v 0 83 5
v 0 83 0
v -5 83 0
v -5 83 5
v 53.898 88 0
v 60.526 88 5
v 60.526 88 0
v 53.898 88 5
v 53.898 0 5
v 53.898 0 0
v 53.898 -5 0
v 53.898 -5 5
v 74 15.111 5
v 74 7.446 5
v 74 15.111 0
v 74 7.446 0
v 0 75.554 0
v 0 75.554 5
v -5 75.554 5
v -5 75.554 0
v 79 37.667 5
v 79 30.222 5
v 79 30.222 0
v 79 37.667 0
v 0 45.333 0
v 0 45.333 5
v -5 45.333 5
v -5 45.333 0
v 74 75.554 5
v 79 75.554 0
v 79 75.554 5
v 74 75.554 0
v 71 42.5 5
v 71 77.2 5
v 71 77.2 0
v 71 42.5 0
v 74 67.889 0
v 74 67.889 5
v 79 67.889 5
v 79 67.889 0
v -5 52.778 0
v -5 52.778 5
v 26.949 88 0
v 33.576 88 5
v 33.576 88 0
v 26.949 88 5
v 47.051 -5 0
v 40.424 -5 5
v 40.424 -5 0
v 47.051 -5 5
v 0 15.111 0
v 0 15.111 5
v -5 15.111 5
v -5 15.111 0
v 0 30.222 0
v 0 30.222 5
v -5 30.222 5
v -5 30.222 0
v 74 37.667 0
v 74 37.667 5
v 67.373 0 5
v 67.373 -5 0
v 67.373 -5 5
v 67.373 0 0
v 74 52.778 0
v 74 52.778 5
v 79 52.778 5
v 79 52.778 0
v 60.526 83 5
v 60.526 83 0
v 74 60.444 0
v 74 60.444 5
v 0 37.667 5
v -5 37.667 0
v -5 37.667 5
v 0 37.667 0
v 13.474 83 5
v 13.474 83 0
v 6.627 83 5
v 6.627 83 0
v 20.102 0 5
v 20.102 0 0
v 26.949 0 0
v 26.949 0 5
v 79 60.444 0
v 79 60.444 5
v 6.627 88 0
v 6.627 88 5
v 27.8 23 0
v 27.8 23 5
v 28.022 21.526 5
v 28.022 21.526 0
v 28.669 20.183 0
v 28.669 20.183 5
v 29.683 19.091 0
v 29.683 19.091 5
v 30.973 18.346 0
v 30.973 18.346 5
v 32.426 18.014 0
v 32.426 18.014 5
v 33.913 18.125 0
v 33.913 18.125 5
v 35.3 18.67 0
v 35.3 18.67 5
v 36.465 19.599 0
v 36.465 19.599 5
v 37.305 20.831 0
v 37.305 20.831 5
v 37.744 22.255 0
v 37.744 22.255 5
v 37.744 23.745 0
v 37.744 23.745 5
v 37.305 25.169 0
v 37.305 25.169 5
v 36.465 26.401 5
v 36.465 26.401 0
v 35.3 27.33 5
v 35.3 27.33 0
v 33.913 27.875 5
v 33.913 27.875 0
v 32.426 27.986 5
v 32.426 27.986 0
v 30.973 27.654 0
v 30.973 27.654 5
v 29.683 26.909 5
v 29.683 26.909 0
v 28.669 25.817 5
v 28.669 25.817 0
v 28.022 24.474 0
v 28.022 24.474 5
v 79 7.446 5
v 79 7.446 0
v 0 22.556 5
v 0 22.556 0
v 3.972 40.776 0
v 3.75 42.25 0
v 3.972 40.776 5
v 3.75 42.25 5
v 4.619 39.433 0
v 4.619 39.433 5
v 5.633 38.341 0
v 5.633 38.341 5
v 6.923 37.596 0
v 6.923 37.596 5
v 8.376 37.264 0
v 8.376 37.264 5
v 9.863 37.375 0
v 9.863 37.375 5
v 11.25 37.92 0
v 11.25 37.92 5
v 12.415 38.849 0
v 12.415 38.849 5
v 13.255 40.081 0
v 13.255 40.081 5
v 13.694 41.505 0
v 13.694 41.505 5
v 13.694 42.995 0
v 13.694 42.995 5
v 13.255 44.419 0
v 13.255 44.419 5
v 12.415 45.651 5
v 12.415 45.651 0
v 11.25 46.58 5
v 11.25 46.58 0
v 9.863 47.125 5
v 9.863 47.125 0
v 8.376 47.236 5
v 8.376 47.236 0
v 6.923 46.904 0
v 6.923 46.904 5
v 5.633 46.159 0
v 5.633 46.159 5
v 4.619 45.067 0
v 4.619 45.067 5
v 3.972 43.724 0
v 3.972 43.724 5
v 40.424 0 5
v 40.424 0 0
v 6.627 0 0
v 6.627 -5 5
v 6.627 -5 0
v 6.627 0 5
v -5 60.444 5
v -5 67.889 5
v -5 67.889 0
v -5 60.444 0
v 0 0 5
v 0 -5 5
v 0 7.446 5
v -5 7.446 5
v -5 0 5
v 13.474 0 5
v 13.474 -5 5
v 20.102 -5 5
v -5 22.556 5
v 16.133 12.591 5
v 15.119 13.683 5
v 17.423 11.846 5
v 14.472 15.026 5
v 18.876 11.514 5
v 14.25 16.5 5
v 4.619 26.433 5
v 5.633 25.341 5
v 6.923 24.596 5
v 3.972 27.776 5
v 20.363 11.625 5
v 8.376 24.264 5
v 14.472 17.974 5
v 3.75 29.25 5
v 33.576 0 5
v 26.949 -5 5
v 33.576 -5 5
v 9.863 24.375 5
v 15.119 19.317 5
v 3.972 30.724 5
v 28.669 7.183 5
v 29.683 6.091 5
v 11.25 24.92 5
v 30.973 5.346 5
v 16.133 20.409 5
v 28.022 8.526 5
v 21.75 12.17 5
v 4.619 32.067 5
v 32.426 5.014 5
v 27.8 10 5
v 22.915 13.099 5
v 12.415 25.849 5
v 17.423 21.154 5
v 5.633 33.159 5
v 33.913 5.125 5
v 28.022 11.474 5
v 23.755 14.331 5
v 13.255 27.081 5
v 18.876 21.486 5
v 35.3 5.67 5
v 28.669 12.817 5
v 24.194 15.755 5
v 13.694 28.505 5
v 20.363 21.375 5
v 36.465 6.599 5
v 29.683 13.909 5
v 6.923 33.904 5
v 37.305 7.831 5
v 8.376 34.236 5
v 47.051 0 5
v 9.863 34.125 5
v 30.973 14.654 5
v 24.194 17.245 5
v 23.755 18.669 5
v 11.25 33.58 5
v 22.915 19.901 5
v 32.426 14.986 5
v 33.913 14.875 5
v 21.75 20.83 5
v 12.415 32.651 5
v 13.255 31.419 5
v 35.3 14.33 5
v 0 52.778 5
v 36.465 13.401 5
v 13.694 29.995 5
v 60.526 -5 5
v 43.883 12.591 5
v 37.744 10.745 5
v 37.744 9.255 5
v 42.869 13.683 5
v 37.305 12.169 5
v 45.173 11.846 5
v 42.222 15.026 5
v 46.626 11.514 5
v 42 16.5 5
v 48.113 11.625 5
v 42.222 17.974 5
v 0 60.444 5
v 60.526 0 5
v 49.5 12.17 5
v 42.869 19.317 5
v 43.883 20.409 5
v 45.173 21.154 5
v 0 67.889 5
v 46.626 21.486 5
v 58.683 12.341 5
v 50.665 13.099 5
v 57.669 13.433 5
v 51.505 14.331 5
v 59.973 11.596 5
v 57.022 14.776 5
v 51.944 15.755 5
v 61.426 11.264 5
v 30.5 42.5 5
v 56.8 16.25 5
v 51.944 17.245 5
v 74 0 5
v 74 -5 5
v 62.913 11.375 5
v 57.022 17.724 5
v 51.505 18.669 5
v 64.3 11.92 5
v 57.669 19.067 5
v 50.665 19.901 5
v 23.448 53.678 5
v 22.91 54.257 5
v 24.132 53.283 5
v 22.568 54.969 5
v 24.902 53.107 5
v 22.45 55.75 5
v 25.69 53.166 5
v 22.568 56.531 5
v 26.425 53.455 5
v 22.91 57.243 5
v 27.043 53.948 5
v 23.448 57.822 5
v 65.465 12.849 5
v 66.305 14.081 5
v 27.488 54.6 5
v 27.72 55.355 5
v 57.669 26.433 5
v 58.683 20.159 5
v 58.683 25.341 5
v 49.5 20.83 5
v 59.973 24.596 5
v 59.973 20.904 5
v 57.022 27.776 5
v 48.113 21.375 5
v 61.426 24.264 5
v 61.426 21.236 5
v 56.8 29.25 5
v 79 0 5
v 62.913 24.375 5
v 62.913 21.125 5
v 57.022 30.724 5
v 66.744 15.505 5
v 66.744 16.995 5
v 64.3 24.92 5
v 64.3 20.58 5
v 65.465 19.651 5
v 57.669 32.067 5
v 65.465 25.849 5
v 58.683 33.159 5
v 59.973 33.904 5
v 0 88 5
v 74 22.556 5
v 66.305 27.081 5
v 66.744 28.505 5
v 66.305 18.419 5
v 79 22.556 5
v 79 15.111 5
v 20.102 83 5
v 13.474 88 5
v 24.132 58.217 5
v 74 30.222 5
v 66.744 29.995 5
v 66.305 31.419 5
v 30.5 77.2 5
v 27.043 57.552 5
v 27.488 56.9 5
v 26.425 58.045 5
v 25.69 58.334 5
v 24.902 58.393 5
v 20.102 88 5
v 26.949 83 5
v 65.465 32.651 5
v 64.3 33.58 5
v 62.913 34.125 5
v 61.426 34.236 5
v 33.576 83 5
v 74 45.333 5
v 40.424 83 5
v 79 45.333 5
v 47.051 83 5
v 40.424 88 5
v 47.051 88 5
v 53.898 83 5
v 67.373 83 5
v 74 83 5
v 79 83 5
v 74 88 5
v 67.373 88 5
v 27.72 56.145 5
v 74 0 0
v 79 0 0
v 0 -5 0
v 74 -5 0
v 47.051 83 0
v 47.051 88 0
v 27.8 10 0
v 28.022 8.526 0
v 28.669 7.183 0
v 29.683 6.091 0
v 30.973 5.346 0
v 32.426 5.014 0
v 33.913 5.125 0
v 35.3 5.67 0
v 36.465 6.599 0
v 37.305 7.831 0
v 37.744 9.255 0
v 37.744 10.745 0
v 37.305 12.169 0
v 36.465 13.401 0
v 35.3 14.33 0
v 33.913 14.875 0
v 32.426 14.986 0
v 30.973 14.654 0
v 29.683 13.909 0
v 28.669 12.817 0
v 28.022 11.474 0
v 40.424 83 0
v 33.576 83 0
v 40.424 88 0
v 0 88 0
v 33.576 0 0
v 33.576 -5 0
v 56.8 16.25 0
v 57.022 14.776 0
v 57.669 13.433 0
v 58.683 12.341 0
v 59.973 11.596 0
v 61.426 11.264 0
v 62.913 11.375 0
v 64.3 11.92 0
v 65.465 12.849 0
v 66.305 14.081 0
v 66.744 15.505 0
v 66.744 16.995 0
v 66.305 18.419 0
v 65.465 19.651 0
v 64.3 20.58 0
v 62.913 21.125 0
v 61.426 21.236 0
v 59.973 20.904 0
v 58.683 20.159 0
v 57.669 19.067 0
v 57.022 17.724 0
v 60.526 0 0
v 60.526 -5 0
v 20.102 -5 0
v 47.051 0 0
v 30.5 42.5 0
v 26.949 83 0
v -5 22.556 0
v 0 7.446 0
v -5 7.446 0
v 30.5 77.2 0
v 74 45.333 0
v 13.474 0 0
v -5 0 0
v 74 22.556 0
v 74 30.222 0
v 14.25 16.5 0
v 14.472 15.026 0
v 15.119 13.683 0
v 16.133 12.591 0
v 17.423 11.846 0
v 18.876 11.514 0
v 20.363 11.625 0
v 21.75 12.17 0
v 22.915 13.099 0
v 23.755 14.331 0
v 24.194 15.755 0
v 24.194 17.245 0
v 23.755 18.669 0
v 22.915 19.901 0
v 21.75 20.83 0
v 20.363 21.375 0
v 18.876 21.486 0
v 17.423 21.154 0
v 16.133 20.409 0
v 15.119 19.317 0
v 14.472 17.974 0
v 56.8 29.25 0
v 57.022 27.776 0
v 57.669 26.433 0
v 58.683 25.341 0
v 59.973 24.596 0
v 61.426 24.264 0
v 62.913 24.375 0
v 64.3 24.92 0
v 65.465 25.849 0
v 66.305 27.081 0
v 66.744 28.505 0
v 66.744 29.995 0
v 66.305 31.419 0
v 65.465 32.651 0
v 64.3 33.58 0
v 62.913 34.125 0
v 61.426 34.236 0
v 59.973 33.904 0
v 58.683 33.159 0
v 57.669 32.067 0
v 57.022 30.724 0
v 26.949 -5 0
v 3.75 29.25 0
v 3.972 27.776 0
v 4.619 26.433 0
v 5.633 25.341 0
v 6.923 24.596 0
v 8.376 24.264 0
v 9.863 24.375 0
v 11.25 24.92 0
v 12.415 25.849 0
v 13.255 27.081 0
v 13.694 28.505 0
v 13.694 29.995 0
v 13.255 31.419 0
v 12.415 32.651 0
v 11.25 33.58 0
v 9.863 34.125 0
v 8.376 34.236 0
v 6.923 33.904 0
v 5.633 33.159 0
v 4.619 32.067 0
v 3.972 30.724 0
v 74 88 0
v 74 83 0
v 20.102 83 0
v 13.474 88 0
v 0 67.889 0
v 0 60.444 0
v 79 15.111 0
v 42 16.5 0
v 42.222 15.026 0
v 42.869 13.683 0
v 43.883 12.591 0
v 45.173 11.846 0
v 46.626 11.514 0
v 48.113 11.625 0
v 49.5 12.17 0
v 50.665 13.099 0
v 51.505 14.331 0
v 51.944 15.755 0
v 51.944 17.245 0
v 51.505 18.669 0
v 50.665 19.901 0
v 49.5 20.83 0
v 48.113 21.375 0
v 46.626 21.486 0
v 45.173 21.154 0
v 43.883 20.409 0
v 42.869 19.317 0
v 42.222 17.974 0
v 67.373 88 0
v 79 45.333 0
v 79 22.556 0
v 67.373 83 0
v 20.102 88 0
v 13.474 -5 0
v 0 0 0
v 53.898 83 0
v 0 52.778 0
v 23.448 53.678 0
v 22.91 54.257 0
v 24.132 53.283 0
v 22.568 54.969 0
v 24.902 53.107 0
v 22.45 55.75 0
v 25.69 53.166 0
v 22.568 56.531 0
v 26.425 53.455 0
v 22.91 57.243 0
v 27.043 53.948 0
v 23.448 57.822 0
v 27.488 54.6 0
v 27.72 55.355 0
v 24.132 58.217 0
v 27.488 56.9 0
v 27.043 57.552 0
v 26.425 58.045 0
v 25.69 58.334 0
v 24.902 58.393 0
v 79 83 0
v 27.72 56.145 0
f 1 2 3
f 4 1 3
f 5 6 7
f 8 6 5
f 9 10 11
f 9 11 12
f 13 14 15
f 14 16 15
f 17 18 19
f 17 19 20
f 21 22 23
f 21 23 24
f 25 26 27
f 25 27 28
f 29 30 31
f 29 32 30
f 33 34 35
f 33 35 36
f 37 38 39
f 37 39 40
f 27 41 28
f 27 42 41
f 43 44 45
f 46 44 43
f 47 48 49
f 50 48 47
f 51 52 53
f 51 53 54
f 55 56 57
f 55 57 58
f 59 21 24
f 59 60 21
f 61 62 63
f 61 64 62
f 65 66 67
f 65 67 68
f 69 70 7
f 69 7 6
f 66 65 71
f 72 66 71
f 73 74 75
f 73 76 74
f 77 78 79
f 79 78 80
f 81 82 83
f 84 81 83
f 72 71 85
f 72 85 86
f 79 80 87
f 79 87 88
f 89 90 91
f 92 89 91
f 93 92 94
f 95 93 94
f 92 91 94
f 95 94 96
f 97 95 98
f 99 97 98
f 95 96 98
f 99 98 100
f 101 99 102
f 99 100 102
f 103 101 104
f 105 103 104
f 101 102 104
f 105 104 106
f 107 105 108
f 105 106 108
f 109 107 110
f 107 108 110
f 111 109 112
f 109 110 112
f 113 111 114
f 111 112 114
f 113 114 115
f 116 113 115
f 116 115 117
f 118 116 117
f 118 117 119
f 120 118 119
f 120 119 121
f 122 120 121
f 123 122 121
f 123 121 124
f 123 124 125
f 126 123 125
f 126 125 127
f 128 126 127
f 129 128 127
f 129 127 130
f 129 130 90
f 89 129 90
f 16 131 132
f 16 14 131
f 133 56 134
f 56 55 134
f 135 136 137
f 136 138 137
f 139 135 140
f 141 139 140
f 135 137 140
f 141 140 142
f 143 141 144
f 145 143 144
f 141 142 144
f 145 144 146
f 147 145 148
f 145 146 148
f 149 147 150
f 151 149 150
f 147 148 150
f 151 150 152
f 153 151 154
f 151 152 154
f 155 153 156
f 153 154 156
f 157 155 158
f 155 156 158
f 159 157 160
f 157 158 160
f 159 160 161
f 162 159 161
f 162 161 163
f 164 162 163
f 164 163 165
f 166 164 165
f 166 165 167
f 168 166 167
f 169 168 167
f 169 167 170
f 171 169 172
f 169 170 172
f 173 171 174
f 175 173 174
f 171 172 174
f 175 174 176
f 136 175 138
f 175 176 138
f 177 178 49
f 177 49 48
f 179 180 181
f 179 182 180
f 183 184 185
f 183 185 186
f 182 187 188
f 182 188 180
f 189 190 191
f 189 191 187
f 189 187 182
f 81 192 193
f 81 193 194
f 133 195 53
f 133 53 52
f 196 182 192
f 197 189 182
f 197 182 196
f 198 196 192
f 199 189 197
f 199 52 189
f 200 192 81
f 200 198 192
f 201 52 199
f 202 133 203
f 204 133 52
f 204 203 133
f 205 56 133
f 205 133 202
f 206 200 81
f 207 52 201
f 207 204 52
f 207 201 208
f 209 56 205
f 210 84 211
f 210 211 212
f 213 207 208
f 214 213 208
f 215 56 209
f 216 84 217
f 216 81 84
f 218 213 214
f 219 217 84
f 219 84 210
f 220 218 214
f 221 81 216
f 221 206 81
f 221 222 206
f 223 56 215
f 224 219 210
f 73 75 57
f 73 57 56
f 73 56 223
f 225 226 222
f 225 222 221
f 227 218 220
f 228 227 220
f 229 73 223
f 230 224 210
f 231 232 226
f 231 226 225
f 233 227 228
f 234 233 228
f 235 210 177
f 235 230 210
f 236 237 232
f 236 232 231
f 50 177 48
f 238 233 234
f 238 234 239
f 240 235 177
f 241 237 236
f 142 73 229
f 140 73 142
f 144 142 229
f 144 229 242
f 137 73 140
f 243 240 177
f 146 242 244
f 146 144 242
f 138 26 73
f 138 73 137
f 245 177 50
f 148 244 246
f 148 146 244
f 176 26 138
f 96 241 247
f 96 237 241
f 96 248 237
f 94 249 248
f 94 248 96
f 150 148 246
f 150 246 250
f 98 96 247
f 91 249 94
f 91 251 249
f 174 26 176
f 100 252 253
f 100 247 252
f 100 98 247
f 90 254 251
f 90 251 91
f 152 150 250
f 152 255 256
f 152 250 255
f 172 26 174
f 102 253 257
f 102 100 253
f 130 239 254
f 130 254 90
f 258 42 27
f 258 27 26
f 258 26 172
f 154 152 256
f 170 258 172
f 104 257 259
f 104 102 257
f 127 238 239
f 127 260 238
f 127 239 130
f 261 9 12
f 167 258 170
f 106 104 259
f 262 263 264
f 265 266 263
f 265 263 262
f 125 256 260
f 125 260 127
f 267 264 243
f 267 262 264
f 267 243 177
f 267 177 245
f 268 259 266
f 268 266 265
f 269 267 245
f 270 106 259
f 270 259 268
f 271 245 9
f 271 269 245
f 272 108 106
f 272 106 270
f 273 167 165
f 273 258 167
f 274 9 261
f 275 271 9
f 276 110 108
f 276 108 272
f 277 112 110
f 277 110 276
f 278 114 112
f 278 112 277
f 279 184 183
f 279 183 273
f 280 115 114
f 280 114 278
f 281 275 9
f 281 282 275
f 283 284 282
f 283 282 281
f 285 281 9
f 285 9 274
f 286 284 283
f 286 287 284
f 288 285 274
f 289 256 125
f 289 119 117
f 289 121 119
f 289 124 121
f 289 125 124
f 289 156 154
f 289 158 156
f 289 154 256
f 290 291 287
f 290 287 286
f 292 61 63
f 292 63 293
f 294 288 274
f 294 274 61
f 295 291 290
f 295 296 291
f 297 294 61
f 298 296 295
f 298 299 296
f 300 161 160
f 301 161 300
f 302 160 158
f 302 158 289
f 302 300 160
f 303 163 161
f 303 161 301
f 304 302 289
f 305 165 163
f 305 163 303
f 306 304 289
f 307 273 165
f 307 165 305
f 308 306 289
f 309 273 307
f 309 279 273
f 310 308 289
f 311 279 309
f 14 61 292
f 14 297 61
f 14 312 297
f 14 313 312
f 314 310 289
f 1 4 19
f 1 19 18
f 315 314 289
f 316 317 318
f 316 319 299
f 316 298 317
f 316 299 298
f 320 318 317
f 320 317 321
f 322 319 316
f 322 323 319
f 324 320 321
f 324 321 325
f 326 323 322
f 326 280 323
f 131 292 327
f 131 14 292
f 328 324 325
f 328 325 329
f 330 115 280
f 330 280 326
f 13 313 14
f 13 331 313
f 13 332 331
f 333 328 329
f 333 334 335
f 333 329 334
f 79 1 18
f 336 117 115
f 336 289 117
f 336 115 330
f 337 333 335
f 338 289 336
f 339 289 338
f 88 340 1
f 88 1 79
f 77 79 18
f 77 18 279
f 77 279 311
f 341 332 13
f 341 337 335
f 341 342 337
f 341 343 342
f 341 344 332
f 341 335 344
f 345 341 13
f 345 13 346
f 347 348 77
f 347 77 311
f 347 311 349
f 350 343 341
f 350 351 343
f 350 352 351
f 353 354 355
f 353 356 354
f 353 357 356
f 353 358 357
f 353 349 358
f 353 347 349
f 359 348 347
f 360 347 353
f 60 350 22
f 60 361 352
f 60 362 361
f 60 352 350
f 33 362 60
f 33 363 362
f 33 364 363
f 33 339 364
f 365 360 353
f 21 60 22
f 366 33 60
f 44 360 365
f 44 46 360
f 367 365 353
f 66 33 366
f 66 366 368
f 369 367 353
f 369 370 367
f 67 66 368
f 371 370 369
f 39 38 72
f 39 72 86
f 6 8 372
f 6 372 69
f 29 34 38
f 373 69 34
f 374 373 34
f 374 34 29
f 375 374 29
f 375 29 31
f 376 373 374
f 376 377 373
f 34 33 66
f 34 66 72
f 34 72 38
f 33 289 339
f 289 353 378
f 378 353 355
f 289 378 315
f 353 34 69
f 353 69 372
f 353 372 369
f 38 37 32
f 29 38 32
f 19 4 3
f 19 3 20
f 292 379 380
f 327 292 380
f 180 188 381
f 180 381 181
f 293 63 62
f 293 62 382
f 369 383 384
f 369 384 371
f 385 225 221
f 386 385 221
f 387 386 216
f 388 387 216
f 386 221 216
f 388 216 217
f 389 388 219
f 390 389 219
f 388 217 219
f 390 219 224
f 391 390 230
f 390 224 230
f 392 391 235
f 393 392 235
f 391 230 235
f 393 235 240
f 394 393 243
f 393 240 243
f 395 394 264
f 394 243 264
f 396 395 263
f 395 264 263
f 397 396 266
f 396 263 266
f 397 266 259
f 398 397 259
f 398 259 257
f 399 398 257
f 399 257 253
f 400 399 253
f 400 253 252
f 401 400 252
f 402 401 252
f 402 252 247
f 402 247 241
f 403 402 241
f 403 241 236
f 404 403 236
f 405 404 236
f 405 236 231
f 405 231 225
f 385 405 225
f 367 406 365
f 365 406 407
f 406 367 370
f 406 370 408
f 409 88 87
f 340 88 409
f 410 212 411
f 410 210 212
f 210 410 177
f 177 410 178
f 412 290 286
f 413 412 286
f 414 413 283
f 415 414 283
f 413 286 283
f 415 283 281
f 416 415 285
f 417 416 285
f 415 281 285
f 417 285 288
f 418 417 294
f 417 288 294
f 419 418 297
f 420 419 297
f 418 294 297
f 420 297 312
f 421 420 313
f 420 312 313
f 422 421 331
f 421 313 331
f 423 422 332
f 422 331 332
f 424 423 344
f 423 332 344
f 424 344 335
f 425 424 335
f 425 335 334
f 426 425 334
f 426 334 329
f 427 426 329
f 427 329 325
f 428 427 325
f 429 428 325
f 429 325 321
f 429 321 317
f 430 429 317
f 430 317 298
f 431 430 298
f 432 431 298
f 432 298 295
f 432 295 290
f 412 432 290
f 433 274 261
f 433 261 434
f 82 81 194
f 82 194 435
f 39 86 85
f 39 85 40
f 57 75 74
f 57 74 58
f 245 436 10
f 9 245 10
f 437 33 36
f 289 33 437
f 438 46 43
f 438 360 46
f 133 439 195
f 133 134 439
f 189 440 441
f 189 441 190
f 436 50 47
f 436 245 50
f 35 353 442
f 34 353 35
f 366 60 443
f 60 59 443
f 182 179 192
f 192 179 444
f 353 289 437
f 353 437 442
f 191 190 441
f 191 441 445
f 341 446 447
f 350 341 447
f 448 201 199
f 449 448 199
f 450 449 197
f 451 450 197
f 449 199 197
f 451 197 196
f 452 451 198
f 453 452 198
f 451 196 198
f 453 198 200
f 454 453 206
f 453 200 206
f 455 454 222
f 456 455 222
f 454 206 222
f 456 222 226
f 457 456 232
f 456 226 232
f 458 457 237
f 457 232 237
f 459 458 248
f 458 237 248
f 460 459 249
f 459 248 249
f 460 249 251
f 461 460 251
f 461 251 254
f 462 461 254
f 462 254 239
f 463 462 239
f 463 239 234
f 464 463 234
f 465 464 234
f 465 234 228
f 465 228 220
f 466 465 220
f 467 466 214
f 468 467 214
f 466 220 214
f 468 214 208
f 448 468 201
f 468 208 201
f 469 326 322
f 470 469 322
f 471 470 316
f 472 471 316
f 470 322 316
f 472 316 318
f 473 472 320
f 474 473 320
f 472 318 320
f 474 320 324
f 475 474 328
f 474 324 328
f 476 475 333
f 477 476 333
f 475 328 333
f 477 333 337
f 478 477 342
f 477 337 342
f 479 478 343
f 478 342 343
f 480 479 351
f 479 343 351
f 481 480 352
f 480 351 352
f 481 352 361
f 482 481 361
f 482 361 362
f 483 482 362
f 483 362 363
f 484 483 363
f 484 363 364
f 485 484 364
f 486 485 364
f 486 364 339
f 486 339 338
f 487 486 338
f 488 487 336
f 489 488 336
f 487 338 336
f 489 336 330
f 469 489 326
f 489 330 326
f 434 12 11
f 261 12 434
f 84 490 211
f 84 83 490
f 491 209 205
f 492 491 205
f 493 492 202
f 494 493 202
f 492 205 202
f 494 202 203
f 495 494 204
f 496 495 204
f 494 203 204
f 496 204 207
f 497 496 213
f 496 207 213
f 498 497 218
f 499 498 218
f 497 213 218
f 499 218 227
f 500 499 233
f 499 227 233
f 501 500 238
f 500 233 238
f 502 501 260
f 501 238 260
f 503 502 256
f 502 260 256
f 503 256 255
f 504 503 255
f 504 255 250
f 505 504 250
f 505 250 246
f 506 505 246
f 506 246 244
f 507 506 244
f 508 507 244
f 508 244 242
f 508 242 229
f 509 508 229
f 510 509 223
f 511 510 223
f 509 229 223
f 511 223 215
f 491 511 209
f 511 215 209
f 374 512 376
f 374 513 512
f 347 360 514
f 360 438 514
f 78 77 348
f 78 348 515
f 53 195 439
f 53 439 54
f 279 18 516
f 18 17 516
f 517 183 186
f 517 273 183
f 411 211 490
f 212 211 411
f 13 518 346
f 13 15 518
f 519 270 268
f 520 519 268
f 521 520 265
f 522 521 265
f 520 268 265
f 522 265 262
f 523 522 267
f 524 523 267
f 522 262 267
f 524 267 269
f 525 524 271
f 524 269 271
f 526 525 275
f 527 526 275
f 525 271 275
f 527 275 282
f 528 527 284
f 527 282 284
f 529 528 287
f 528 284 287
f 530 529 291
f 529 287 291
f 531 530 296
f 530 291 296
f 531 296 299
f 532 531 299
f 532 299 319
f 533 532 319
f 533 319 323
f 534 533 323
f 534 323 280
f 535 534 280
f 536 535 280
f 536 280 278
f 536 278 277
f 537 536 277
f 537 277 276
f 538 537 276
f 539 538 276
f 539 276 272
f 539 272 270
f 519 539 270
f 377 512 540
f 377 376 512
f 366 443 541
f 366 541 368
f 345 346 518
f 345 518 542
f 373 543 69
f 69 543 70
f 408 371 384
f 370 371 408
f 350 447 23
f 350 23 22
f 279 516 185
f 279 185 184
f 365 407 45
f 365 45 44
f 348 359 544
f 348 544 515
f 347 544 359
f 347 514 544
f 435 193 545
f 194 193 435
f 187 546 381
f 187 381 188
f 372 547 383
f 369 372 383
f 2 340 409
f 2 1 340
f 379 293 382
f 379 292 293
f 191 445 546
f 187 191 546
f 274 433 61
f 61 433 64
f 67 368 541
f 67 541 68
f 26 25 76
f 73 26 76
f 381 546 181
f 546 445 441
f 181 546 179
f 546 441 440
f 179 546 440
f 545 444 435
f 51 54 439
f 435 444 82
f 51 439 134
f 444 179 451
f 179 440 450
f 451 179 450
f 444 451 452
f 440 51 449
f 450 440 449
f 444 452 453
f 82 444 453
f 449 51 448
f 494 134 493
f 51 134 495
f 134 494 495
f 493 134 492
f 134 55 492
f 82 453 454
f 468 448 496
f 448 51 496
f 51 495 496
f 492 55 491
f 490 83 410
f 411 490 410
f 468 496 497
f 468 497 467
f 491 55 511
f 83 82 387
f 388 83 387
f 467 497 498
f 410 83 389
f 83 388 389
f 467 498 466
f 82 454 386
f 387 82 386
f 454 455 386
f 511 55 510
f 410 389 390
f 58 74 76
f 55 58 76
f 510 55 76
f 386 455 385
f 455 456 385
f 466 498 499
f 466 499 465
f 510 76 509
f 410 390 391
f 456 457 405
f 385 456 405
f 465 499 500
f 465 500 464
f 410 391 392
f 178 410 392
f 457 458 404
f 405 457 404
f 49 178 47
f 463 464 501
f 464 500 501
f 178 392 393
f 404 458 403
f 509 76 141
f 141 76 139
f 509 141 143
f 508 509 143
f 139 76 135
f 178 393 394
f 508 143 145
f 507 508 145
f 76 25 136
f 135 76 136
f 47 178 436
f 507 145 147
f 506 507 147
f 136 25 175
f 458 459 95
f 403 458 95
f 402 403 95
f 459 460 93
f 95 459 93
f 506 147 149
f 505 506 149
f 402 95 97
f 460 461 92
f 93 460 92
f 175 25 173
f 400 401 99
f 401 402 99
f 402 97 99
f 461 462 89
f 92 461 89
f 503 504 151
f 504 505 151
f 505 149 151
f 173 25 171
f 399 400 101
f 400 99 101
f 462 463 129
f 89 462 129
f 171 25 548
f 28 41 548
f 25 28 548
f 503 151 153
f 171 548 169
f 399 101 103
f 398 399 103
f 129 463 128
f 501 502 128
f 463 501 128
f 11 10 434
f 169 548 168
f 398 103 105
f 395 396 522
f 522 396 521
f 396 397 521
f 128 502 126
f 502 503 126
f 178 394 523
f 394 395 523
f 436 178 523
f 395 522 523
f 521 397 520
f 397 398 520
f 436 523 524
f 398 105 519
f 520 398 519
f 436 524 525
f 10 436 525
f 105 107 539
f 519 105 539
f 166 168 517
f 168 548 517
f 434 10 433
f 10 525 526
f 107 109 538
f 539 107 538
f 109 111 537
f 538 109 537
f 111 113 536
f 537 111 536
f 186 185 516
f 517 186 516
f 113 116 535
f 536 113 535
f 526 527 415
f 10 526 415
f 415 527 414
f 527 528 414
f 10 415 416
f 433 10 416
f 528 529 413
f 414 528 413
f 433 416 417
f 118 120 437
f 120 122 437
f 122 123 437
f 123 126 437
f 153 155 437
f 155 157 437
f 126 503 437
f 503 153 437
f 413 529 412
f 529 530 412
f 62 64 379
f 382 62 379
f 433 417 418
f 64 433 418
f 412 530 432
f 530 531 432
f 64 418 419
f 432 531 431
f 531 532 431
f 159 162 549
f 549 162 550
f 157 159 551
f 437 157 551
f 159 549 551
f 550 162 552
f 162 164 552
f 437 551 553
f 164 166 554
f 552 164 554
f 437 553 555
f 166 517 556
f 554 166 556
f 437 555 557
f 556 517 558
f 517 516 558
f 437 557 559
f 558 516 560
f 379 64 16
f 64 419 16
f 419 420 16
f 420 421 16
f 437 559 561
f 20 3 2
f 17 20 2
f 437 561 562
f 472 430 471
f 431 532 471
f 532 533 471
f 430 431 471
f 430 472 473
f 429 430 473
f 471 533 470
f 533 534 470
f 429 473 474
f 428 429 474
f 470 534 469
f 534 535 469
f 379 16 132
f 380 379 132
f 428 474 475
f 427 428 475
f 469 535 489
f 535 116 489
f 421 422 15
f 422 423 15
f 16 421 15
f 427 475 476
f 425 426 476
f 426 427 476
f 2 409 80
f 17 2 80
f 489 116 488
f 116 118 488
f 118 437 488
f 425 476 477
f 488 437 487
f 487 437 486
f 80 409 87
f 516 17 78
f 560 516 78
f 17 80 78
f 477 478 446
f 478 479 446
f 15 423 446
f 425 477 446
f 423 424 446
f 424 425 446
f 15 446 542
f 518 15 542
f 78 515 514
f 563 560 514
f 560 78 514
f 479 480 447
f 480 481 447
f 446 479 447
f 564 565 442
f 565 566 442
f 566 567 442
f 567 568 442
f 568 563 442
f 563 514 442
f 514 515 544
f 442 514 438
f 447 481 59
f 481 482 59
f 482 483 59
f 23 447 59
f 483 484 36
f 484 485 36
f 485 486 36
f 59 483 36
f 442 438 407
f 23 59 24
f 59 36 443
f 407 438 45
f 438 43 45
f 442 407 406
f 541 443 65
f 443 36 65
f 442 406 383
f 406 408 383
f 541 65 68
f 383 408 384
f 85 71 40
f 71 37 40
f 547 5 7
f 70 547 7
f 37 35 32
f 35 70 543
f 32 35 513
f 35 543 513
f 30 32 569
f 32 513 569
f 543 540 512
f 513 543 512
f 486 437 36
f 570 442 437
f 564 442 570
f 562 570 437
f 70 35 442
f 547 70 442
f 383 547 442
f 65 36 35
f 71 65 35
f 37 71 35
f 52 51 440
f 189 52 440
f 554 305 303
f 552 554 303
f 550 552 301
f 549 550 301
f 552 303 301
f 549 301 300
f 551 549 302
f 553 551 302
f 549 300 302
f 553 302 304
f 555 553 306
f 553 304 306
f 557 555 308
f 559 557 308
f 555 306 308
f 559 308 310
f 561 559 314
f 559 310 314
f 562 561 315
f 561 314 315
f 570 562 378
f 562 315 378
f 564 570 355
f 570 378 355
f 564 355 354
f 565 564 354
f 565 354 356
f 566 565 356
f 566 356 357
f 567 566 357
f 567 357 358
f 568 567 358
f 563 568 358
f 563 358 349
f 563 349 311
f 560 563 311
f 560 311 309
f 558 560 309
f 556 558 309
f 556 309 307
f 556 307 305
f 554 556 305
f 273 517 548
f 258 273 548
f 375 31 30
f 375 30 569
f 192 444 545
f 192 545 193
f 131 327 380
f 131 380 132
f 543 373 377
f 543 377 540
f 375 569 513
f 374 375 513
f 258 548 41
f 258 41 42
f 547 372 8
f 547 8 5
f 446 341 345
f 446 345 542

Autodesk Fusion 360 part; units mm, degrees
sketch "Sketch1" plane through (0, 0, 0) normal (0, 0, 1) x (1, 0, 0)
  line L0 (0, 0) -> (74, 0)
  line L1 (74, 0) -> (74, 83)
  line L2 (74, 83) -> (0, 83)
  line L3 (0, 83) -> (0, 0)
  dimension "d1" = 74
  dimension "d2" = 83
extrude "Extrude1" add sketch "Sketch1" along normal blind 5
sketch "Sketch2" plane through (0, 0, 5) normal (0, 0, 1) x (-1, 0, 0)
  line L0 (0, -83) -> (0, 0)
  line L1 (0, 0) -> (-74, 0)
  line L2 (-74, 0) -> (-74, -83)
  line L3 (-74, -83) -> (0, -83)
  line L4 (-30.5, -77.2) -> (-71, -77.2)
  line L5 (-71, -77.2) -> (-71, -42.5)
  line L6 (-71, -42.5) -> (-30.5, -42.5)
  line L7 (-30.5, -42.5) -> (-30.5, -77.2)
  line L8 (-55.8, -22.25) -> (-67.8, -22.25)
  line L9 (-67.8, -22.25) -> (-67.8, -10.25)
  line L10 (-67.8, -10.25) -> (-55.8, -10.25)
  line L11 (-55.8, -10.25) -> (-55.8, -22.25)
  line L12 (-55.8, -35.25) -> (-67.8, -35.25)
  line L13 (-67.8, -35.25) -> (-67.8, -23.25)
  line L14 (-67.8, -23.25) -> (-55.8, -23.25)
  line L15 (-55.8, -23.25) -> (-55.8, -35.25)
  line L16 (-55.8, -29.25) -> (-67.8, -29.25) construction
  line L17 (-61.8, -35.25) -> (-61.8, -23.25) construction
  circle A0 centre (-61.8, -29.25) radius 5
  line L18 (-61.8, -22.25) -> (-61.8, -10.25) construction
  line L19 (-55.8, -16.25) -> (-67.8, -16.25) construction
  circle A1 centre (-61.8, -16.25) radius 5
  line L20 (-25.25, -10.5) -> (-13.25, -10.5)
  line L21 (-13.25, -10.5) -> (-13.25, -22.5)
  line L22 (-13.25, -22.5) -> (-25.25, -22.5)
  line L23 (-25.25, -22.5) -> (-25.25, -10.5)
  circle A2 centre (-19.25, -16.5) radius 5
  line L24 (-38.8, -4) -> (-26.8, -4)
  line L25 (-26.8, -4) -> (-26.8, -16)
  line L26 (-26.8, -16) -> (-38.8, -16)
  line L27 (-38.8, -16) -> (-38.8, -4)
  circle A3 centre (-32.8, -10) radius 5
  line L28 (-38.8, -17) -> (-26.8, -17)
  line L29 (-26.8, -17) -> (-26.8, -29)
  line L30 (-26.8, -29) -> (-38.8, -29)
  line L31 (-38.8, -29) -> (-38.8, -17)
  circle A4 centre (-32.8, -23) radius 5
  line L32 (-53, -10.5) -> (-41, -10.5)
  line L33 (-41, -10.5) -> (-41, -22.5)
  line L34 (-41, -22.5) -> (-53, -22.5)
  line L35 (-53, -22.5) -> (-53, -10.5)
  circle A5 centre (-47, -16.5) radius 5
  line L36 (-14.75, -36.25) -> (-2.75, -36.25)
  line L37 (-2.75, -36.25) -> (-2.75, -48.25)
  line L38 (-2.75, -48.25) -> (-14.75, -48.25)
  line L39 (-14.75, -48.25) -> (-14.75, -36.25)
  circle A6 centre (-8.75, -42.25) radius 5
  line L40 (-14.75, -23.25) -> (-2.75, -23.25)
  line L41 (-2.75, -23.25) -> (-2.75, -35.25)
  line L42 (-2.75, -35.25) -> (-14.75, -35.25)
  line L43 (-14.75, -35.25) -> (-14.75, -23.25)
  circle A7 centre (-8.75, -29.25) radius 5
  circle A8 centre (-25.1, -55.75) radius 2.65
  dimension "d5" = 30.5
  dimension "d6" = 42.5
  dimension "d7" = 34.7
  dimension "d8" = 40.5
  dimension "d11" = 12
  dimension "d14" = 12
  dimension "d15" = 6.2
  dimension "d16" = 10.25
  dimension "d17" = 6.2
  dimension "d19" = 1
  dimension "d20" = 10
  dimension "d21" = 10
  dimension "d22" = 12
  dimension "d23" = 10
  dimension "d24" = 12
  dimension "d25" = 10
  dimension "d26" = 12
  dimension "d27" = 10
  dimension "d28" = 12
  dimension "d29" = 10
  dimension "d32" = 10.5
  dimension "d33" = 6
  dimension "d34" = 6
  dimension "d35" = 4
  dimension "d36" = 6
  dimension "d37" = 6
  dimension "d38" = 21
  dimension "d39" = 17
  dimension "d40" = 6
  dimension "d41" = 6
  dimension "d42" = 35.2
  dimension "d43" = 6
  dimension "d44" = 6
  dimension "d45" = 13.25
  dimension "d46" = 10.5
  dimension "d47" = 12
  dimension "d48" = 10
  dimension "d49" = 6
  dimension "d50" = 6
  dimension "d51" = 12
  dimension "d52" = 10
  dimension "d53" = 6
  dimension "d54" = 6
  dimension "d55" = 2.75
  dimension "d56" = 23.25
  dimension "d57" = 1
  dimension "d58" = 5.3
  dimension "d59" = 27.25
  dimension "d60" = 25.1
extrude "Extrude3" cut sketch "Sketch2" against normal blind 5 contours A8
extrude "Extrude2" cut sketch "Sketch2" against normal blind 5 contours L4 L5 L6 L7 | A0 | A1 | A2 | A3 | A4 | A5 | A6 | A7
sketch "Sketch3" plane through (74, 0, 0) normal (1, 0, 0) x (0, 1, 0)
  line L0 (0, 0) -> (83, 0)
  line L1 (83, 0) -> (83, 5)
  line L2 (83, 5) -> (0, 5)
  line L3 (0, 5) -> (0, 0)
  line L4 (0, 5) -> (7.4455, 5)
  line L5 (7.4455, 5) -> (7.4455, 0)
  line L6 (7.4455, 0) -> (0, 0)
  line L7 (0, 0) -> (0, 5)
  line L8 (15.1109, 0) -> (15.1109, 5)
  line L9 (15.1109, 5) -> (22.5564, 5)
  line L10 (22.5564, 5) -> (22.5564, 0)
  line L11 (22.5564, 0) -> (15.1109, 0)
  line L12 (30.2218, 0) -> (30.2218, 5)
  line L13 (30.2218, 5) -> (37.6673, 5)
  line L14 (37.6673, 5) -> (37.6673, 0)
  line L15 (37.6673, 0) -> (30.2218, 0)
  line L16 (45.3327, 0) -> (45.3327, 5)
  line L17 (45.3327, 5) -> (52.7782, 5)
  line L18 (52.7782, 5) -> (52.7782, 0)
  line L19 (52.7782, 0) -> (45.3327, 0)
  line L20 (60.4436, 0) -> (60.4436, 5)
  line L21 (60.4436, 5) -> (67.8891, 5)
  line L22 (67.8891, 5) -> (67.8891, 0)
  line L23 (67.8891, 0) -> (60.4436, 0)
  line L24 (75.5545, 0) -> (75.5545, 5)
  line L25 (75.5545, 5) -> (83, 5)
  line L26 (83, 5) -> (83, 0)
  line L27 (83, 0) -> (75.5545, 0)
  dimension "d70" = 7.4455
  dimension "d74" = 75.5545
  dimension "d75" = 0
extrude "Extrude4" add sketch "Sketch3" along normal blind 5 contours L0 L2 L3 L4 L5 L6 L7 | L0 L2 L8 L9 L10 L11 | L0 L2 L12 L13 L14 L15 | L0 L2 L16 L17 L18 L19 | L0 L2 L20 L21 L22 L23 | L0 L1 L2 L24 L25 L26 L27
sketch "Sketch4" plane through (0, 0, 0) normal (-1, 0, 0) x (0, -1, 0)
  line L0 (-83, 0) -> (0, 0)
  line L1 (0, 0) -> (0, 5)
  line L2 (0, 5) -> (-83, 5)
  line L3 (-83, 5) -> (-83, 0)
  line L4 (-83, 5) -> (-75.5545, 5)
  line L5 (-75.5545, 5) -> (-75.5545, 0)
  line L6 (-75.5545, 0) -> (-83, 0)
  line L7 (-83, 0) -> (-83, 5)
  line L8 (-67.8891, 0) -> (-67.8891, 5)
  line L9 (-67.8891, 5) -> (-60.4436, 5)
  line L10 (-60.4436, 5) -> (-60.4436, 0)
  line L11 (-60.4436, 0) -> (-67.8891, 0)
  line L12 (-52.7782, 0) -> (-52.7782, 5)
  line L13 (-52.7782, 5) -> (-45.3327, 5)
  line L14 (-45.3327, 5) -> (-45.3327, 0)
  line L15 (-45.3327, 0) -> (-52.7782, 0)
  line L16 (-37.6673, 0) -> (-37.6673, 5)
  line L17 (-37.6673, 5) -> (-30.2218, 5)
  line L18 (-30.2218, 5) -> (-30.2218, 0)
  line L19 (-30.2218, 0) -> (-37.6673, 0)
  line L20 (-22.5564, 0) -> (-22.5564, 5)
  line L21 (-22.5564, 5) -> (-15.1109, 5)
  line L22 (-15.1109, 5) -> (-15.1109, 0)
  line L23 (-15.1109, 0) -> (-22.5564, 0)
  line L24 (-7.4455, 0) -> (-7.4455, 5)
  line L25 (-7.4455, 5) -> (0, 5)
  line L26 (0, 5) -> (0, 0)
  line L27 (0, 0) -> (-7.4455, 0)
  dimension "d78" = 7.4455
  dimension "d81" = 75.5545
  dimension "d82" = 0
extrude "Extrude5" add sketch "Sketch4" along normal blind 5 contours L0 L2 L3 L4 L5 L6 L7 | L0 L2 L8 L9 L10 L11 | L0 L2 L12 L13 L14 L15 | L0 L2 L16 L17 L18 L19 | L0 L2 L20 L21 L22 L23 | L0 L1 L2 L24 L25 L26 L27
sketch "Sketch5" plane through (0, 0, 0) normal (0, -1, 0) x (1, 0, 0)
  line L0 (-5, 0) -> (79, 0)
  line L1 (79, 0) -> (79, 5)
  line L2 (79, 5) -> (-5, 5)
  line L3 (-5, 5) -> (-5, 0)
  line L4 (0, 5) -> (6.6273, 5)
  line L5 (6.6273, 5) -> (6.6273, 0)
  line L6 (6.6273, 0) -> (0, 0)
  line L7 (0, 0) -> (0, 5)
  line L8 (13.4745, 0) -> (13.4745, 5)
  line L9 (13.4745, 5) -> (20.1018, 5)
  line L10 (20.1018, 5) -> (20.1018, 0)
  line L11 (20.1018, 0) -> (13.4745, 0)
  line L12 (26.9491, 0) -> (26.9491, 5)
  line L13 (26.9491, 5) -> (33.5764, 5)
  line L14 (33.5764, 5) -> (33.5764, 0)
  line L15 (33.5764, 0) -> (26.9491, 0)
  line L16 (40.4236, 0) -> (40.4236, 5)
  line L17 (40.4236, 5) -> (47.0509, 5)
  line L18 (47.0509, 5) -> (47.0509, 0)
  line L19 (47.0509, 0) -> (40.4236, 0)
  line L20 (53.8982, 0) -> (53.8982, 5)
  line L21 (53.8982, 5) -> (60.5255, 5)
  line L22 (60.5255, 5) -> (60.5255, 0)
  line L23 (60.5255, 0) -> (53.8982, 0)
  line L24 (67.3727, 0) -> (67.3727, 5)
  line L25 (67.3727, 5) -> (74, 5)
  line L26 (74, 5) -> (74, 0)
  line L27 (74, 0) -> (67.3727, 0)
  point P0 (0, 5)
  dimension "d85" = 6.6273
  dimension "d88" = 67.3727
  dimension "d89" = 0
extrude "Extrude6" add sketch "Sketch5" along normal blind 5 contours L0 L2 L4 L5 L6 L7 | L0 L2 L8 L9 L10 L11 | L0 L2 L12 L13 L14 L15 | L0 L2 L16 L17 L18 L19 | L0 L2 L20 L21 L22 L23 | L0 L2 L24 L25 L26 L27
sketch "Sketch6" plane through (0, 83, 0) normal (0, 1, 0) x (-1, 0, 0)
  line L0 (-79, 0) -> (5, 0)
  line L1 (5, 0) -> (5, 5)
  line L2 (5, 5) -> (-79, 5)
  line L3 (-79, 5) -> (-79, 0)
  line L4 (-74, 5) -> (-67.3727, 5)
  line L5 (-67.3727, 5) -> (-67.3727, 0)
  line L6 (-67.3727, 0) -> (-74, 0)
  line L7 (-74, 0) -> (-74, 5)
  line L8 (-60.5255, 0) -> (-60.5255, 5)
  line L9 (-60.5255, 5) -> (-53.8982, 5)
  line L10 (-53.8982, 5) -> (-53.8982, 0)
  line L11 (-53.8982, 0) -> (-60.5255, 0)
  line L12 (-47.0509, 0) -> (-47.0509, 5)
  line L13 (-47.0509, 5) -> (-40.4236, 5)
  line L14 (-40.4236, 5) -> (-40.4236, 0)
  line L15 (-40.4236, 0) -> (-47.0509, 0)
  line L16 (-33.5764, 0) -> (-33.5764, 5)
  line L17 (-33.5764, 5) -> (-26.9491, 5)
  line L18 (-26.9491, 5) -> (-26.9491, 0)
  line L19 (-26.9491, 0) -> (-33.5764, 0)
  line L20 (-20.1018, 0) -> (-20.1018, 5)
  line L21 (-20.1018, 5) -> (-13.4745, 5)
  line L22 (-13.4745, 5) -> (-13.4745, 0)
  line L23 (-13.4745, 0) -> (-20.1018, 0)
  line L24 (-6.6273, 0) -> (-6.6273, 5)
  line L25 (-6.6273, 5) -> (0, 5)
  line L26 (0, 5) -> (0, 0)
  line L27 (0, 0) -> (-6.6273, 0)
  point P0 (-74, 5)
  point P1 (-67.3727, 0)
  dimension "d94" = 67.3727
  dimension "d95" = 0
extrude "Extrude7" add sketch "Sketch6" along normal blind 5 contours L0 L2 L4 L5 L6 L7 | L0 L2 L8 L9 L10 L11 | L0 L2 L12 L13 L14 L15 | L0 L2 L16 L17 L18 L19 | L0 L2 L20 L21 L22 L23 | L0 L2 L24 L25 L26 L27
equation "pikkus = 83 mm"
equation "laius = 74 mm"
equation "paksus = 5 mm"
equation "pikkus_tapp = pikkus / 11 - 0.1 mm"
equation "laius_tapp = laius / 11 - 0.1 mm"
equation "d70 = pikkus_tapp"
equation "d74 = pikkus - pikkus_tapp"
equation "d76 = paksus"
equation "d78 = pikkus_tapp"
equation "d81 = pikkus - pikkus_tapp"
equation "d83 = paksus"
equation "d85 = laius_tapp"
equation "d88 = laius - laius_tapp"
equation "d90 = paksus"
equation "d94 = laius - laius_tapp"
equation "d96 = paksus"
